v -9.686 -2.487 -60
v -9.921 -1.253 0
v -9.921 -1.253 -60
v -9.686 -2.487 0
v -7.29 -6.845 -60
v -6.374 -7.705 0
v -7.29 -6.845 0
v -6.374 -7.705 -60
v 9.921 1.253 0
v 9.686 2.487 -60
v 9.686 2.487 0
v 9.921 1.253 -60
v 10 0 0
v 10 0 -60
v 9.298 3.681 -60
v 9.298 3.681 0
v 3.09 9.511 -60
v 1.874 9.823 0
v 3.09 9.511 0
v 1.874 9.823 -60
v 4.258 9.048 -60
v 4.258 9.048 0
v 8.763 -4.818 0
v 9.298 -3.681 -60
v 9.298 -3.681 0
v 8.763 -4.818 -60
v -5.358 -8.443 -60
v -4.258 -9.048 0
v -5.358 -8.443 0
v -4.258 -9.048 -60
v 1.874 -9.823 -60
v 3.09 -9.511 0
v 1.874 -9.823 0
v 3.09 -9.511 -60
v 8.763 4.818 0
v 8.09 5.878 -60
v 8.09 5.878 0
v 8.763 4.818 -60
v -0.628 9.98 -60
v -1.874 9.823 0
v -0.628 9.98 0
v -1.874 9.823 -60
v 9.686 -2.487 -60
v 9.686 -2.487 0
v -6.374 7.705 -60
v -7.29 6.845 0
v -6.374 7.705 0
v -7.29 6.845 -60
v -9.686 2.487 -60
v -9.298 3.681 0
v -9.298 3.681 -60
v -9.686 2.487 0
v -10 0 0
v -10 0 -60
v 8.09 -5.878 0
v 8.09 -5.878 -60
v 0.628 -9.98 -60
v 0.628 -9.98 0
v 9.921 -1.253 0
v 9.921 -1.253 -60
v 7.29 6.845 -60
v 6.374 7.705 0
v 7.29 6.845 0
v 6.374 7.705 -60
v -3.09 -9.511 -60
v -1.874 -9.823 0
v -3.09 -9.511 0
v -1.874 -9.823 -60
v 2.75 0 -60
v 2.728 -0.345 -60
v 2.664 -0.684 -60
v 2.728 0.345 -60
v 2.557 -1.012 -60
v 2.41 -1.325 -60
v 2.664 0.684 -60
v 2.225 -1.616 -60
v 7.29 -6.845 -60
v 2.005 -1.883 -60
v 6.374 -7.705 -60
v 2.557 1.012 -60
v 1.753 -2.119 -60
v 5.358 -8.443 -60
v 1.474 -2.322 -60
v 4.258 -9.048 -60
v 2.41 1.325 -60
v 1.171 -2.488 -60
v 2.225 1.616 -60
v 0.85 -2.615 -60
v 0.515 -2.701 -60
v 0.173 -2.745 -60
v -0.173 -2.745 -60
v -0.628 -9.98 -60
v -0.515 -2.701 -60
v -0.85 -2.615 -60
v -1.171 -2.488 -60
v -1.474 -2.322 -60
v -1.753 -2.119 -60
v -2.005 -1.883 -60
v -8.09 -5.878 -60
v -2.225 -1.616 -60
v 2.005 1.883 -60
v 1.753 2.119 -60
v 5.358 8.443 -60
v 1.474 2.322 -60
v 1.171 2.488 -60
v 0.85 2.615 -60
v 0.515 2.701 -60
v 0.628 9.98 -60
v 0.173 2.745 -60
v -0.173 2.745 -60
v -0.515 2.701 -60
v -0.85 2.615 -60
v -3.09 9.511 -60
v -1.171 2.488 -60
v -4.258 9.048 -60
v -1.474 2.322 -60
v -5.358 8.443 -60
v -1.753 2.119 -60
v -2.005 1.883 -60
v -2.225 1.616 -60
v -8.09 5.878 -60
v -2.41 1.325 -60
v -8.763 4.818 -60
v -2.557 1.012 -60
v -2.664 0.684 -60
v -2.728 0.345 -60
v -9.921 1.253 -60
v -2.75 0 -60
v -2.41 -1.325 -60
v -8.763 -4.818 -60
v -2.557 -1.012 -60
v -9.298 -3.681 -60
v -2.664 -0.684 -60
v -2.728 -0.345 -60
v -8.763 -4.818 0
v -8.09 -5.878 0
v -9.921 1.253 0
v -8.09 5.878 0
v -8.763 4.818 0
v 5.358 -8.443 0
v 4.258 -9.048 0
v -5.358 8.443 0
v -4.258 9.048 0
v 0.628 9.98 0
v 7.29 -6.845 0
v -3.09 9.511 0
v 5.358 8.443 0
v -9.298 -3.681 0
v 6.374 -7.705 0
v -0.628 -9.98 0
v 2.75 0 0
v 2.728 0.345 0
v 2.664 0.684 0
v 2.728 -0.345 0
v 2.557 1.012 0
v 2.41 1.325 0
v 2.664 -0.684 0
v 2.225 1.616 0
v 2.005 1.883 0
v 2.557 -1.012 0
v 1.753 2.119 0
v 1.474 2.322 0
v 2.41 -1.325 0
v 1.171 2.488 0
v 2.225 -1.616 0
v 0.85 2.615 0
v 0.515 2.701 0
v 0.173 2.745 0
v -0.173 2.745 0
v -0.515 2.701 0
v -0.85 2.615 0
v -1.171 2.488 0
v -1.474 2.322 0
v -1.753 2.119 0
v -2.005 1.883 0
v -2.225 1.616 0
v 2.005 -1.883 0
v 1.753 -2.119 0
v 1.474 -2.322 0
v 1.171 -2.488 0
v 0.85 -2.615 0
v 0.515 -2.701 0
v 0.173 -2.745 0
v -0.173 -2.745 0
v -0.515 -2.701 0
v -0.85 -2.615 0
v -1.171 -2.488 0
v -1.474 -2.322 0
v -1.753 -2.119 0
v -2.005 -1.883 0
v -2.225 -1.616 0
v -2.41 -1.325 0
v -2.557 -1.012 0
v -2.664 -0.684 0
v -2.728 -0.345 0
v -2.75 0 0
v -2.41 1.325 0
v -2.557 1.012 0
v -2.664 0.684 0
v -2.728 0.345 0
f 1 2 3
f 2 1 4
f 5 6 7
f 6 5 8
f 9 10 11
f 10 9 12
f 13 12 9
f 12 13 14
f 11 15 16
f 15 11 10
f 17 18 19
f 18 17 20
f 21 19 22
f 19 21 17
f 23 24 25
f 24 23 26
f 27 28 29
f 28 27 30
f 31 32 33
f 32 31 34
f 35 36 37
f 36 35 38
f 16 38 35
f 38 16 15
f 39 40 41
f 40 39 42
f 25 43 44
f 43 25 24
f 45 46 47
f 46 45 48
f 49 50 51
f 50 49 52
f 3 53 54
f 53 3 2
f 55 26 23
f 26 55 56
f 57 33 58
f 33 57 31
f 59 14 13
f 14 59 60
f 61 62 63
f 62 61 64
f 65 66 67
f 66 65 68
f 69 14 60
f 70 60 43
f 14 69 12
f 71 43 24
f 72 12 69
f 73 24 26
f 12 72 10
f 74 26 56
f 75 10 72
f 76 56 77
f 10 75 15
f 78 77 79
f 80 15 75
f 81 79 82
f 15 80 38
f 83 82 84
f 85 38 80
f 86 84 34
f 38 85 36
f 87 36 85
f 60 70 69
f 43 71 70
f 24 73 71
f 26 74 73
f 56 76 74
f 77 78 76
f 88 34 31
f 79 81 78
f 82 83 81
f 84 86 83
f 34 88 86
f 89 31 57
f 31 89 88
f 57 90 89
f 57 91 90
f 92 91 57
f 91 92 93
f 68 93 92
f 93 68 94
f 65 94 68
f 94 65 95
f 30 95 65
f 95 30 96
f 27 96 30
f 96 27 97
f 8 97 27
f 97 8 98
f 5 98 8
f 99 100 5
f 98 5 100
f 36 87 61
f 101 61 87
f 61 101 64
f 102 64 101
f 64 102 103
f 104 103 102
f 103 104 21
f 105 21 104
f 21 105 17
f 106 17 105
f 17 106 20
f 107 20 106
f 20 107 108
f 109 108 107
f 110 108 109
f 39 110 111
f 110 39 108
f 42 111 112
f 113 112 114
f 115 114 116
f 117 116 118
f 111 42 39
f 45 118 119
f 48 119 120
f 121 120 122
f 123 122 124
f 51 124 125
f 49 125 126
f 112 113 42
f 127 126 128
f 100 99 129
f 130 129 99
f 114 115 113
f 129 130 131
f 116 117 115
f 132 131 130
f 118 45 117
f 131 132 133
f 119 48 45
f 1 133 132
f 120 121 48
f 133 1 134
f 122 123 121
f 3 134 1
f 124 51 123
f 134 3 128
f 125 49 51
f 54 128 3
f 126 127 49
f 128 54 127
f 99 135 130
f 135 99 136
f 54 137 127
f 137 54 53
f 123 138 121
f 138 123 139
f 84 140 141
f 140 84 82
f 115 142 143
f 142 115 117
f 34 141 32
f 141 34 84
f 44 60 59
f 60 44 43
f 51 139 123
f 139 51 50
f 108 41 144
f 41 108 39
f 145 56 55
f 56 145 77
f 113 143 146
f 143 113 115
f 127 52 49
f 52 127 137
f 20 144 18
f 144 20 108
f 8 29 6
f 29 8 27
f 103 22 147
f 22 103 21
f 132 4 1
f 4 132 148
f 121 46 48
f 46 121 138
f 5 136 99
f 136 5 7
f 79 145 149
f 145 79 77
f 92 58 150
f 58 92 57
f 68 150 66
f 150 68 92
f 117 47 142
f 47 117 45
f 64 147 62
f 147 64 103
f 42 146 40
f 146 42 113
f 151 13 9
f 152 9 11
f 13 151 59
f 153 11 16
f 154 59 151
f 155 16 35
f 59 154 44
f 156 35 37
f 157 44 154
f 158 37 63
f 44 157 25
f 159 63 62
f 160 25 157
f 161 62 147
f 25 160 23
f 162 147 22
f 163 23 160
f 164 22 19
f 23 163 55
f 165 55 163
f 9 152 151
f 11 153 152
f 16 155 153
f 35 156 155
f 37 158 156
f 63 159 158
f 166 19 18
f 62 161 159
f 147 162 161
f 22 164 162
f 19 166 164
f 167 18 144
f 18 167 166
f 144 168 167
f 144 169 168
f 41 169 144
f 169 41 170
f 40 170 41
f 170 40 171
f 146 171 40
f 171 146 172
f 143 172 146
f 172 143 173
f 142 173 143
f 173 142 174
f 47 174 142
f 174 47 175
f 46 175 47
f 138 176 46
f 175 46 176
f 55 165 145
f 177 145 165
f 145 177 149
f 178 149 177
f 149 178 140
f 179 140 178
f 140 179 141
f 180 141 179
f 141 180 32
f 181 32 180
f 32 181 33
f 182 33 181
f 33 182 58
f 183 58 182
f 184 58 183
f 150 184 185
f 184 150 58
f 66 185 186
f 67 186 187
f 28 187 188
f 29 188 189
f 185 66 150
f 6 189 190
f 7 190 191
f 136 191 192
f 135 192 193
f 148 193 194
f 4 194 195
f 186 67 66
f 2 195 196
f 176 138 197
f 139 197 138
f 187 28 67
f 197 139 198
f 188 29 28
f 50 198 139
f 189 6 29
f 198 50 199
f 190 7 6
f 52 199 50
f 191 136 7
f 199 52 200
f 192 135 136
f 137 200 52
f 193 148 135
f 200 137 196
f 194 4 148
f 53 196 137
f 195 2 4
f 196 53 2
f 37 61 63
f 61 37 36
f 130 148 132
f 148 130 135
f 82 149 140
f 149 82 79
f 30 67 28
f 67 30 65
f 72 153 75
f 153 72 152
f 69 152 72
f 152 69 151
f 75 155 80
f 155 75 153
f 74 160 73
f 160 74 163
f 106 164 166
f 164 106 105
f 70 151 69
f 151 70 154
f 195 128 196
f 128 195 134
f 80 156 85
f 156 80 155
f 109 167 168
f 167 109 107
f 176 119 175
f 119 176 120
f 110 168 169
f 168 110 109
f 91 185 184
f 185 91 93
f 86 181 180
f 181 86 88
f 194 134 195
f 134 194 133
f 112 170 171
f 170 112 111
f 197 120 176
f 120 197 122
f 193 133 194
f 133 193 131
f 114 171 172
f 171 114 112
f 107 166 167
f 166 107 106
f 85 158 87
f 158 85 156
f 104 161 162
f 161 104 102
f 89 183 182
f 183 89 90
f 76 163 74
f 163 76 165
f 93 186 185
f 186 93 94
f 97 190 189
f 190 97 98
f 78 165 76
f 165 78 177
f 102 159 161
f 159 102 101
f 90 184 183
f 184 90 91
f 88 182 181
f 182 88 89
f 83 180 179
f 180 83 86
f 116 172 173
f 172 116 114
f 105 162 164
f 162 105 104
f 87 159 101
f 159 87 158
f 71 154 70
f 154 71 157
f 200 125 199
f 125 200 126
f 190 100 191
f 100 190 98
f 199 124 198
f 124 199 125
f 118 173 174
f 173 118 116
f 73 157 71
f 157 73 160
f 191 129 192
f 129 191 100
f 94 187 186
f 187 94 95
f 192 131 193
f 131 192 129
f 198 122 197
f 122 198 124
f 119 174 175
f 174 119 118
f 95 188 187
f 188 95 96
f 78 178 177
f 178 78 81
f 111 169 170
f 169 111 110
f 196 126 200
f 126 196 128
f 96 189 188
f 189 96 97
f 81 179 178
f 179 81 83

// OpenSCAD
$fn = 50;


difference() {
	union() {
		translate(v = [0, 0, -60.0000000000]) {
			cylinder(h = 60, r = 10.0000000000);
		}
	}
	union() {
		#translate(v = [0, 0, -60]) {
			cylinder(h = 60, r = 2.7500000000);
		}
	}
}
